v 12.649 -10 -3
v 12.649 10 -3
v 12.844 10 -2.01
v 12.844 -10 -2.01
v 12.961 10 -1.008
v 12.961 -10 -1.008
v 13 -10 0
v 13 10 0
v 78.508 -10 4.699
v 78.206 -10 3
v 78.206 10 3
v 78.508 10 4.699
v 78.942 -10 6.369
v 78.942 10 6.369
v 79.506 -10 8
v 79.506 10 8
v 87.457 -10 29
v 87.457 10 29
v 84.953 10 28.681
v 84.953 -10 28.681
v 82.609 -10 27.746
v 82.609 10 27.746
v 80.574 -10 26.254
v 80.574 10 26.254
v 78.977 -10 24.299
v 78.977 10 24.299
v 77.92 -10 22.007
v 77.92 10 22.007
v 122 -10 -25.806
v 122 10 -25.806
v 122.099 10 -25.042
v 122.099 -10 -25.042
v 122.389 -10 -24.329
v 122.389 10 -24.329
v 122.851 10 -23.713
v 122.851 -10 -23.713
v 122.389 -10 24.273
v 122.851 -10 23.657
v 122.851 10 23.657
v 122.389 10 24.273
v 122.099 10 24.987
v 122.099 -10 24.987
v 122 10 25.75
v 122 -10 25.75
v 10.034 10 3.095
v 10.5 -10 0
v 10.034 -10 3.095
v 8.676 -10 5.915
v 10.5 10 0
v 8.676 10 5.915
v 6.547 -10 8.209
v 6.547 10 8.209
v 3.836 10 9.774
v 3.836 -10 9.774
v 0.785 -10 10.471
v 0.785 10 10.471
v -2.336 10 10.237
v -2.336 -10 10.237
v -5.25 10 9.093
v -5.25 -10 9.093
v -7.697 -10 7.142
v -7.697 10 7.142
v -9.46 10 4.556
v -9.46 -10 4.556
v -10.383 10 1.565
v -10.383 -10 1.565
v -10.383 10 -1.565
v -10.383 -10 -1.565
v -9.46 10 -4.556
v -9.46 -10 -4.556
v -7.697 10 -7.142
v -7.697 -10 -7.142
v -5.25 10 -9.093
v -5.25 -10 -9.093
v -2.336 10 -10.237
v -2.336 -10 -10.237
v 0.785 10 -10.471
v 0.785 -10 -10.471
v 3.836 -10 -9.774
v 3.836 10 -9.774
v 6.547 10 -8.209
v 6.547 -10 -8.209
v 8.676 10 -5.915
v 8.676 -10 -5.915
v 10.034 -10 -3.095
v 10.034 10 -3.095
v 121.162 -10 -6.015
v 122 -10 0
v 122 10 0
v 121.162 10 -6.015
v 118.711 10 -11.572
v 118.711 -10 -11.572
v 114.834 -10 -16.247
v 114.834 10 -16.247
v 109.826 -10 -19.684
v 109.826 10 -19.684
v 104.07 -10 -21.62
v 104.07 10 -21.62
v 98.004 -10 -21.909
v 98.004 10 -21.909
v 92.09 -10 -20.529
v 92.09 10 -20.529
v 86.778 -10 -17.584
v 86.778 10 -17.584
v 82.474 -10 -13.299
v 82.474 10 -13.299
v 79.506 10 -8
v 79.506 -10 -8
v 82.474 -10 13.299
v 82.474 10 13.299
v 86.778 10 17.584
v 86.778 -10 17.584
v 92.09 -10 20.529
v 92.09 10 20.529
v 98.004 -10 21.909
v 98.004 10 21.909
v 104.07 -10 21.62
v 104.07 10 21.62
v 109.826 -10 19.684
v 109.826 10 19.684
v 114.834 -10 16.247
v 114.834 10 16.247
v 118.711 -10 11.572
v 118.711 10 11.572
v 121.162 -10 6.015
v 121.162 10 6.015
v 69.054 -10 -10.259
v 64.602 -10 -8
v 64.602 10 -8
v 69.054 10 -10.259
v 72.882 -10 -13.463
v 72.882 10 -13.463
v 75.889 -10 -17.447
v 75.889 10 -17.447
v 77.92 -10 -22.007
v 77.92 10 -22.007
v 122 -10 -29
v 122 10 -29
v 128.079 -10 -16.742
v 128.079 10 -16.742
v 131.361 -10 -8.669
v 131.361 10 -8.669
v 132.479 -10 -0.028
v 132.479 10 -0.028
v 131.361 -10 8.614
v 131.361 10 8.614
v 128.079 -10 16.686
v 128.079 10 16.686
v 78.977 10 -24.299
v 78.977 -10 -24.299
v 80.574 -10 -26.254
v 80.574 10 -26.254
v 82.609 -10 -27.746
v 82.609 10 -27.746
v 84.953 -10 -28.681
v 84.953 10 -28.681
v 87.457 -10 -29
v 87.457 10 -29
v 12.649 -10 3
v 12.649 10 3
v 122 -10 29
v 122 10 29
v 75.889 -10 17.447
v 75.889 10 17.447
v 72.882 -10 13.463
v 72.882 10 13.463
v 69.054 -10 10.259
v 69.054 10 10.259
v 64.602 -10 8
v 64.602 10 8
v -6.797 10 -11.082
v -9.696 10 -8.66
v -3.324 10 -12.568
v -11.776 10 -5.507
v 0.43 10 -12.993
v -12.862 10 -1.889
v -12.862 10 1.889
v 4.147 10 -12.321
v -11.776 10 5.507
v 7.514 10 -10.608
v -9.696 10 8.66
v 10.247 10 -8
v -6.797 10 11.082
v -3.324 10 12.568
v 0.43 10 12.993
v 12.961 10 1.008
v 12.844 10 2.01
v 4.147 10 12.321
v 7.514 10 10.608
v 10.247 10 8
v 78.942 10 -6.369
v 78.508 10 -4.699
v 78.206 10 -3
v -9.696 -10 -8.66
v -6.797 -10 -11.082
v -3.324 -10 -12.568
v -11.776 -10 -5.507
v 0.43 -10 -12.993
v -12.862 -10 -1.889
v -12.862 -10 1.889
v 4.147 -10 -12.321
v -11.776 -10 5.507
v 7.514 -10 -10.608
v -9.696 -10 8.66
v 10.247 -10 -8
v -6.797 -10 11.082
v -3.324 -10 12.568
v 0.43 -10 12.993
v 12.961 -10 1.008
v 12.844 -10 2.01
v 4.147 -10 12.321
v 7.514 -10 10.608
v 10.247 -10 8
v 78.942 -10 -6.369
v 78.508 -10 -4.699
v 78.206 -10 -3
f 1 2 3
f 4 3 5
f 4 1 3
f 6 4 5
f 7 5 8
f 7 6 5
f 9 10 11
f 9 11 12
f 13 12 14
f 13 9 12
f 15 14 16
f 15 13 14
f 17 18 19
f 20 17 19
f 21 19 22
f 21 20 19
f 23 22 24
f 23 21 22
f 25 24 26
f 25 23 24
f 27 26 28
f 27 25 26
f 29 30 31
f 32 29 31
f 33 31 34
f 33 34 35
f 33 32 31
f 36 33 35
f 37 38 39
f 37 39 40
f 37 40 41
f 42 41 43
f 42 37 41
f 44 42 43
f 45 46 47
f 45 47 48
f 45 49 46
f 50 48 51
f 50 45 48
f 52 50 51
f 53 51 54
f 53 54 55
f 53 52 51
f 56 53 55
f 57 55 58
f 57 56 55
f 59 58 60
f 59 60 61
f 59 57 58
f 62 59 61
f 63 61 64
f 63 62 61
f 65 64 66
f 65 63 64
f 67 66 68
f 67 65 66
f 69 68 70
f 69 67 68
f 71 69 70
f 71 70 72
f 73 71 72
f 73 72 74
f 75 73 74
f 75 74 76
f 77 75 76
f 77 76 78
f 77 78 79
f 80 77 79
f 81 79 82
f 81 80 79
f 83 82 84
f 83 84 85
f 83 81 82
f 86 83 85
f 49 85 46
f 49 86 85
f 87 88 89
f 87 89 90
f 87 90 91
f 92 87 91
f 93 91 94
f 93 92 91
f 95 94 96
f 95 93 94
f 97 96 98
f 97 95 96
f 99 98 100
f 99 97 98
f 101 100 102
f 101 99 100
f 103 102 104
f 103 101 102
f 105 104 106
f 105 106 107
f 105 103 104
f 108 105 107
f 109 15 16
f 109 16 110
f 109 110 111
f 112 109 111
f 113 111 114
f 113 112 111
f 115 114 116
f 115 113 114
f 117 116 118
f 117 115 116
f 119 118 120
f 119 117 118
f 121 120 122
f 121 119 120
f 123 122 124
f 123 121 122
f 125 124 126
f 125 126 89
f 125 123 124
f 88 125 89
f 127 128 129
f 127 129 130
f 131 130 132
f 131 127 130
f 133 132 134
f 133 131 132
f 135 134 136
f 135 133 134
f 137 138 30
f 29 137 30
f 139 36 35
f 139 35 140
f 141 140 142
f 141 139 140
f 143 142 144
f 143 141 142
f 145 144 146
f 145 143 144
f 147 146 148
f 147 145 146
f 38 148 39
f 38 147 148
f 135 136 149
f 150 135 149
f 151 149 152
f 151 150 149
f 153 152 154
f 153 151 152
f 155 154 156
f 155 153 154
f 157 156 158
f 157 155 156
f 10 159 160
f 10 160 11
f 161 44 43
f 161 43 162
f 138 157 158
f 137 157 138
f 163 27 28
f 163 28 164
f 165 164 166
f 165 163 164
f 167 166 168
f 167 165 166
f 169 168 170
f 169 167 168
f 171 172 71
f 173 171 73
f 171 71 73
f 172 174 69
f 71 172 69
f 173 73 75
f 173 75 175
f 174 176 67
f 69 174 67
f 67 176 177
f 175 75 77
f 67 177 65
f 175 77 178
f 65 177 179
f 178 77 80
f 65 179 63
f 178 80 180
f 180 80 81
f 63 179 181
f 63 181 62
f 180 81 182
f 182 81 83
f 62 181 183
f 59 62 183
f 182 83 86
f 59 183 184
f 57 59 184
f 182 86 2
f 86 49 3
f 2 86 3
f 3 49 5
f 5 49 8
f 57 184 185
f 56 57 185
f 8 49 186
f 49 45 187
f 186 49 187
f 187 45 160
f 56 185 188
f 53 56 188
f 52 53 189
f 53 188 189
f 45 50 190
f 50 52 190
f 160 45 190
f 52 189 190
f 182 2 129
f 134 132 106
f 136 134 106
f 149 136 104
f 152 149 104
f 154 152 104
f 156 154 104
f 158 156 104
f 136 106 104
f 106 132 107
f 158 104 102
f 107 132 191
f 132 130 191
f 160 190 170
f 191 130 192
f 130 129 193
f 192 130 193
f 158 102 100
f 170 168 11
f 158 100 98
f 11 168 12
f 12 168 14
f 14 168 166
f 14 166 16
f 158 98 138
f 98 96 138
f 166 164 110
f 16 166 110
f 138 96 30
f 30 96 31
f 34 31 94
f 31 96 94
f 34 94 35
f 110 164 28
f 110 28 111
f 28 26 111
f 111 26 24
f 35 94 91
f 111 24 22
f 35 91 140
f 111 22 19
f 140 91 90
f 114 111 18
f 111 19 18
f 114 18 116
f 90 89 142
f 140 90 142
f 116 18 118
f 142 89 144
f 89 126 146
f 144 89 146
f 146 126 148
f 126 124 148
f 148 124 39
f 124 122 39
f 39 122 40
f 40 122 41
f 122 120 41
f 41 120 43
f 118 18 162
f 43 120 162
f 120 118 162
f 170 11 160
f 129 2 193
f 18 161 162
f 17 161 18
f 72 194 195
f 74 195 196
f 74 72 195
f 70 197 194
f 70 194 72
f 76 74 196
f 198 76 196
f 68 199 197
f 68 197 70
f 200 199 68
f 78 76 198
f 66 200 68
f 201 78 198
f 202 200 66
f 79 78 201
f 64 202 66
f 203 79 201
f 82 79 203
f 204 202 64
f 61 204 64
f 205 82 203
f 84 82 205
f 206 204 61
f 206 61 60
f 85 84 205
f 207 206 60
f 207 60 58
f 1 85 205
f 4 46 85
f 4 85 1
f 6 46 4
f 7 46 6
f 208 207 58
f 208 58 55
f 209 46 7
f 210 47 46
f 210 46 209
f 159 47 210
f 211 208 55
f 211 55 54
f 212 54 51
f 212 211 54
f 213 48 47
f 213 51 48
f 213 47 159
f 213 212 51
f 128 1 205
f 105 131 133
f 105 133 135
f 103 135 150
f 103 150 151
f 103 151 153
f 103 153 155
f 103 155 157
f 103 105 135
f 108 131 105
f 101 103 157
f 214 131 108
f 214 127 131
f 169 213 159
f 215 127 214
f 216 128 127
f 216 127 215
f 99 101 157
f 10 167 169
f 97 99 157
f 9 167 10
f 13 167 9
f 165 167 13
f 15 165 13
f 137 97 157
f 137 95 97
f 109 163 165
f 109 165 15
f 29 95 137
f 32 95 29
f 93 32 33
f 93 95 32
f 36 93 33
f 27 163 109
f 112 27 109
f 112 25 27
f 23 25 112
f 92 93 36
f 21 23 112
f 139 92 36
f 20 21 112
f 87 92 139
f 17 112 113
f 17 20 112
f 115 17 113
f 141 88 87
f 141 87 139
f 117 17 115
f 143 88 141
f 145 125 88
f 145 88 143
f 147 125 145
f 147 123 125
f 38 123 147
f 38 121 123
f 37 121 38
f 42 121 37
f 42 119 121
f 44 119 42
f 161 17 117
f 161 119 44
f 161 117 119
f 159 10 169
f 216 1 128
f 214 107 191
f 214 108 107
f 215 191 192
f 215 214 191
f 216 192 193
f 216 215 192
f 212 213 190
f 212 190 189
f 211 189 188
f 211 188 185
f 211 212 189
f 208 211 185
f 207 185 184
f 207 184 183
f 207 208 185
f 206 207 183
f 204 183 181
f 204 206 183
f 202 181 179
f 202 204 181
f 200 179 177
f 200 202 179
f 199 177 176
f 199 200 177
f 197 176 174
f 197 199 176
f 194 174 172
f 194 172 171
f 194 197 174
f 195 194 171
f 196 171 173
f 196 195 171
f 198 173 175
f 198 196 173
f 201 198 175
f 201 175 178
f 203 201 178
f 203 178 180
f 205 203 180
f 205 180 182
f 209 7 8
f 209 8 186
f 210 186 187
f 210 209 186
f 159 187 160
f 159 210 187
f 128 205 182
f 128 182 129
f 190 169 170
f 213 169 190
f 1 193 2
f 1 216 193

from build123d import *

# Parameters (mm, degrees)
F0_R     = 10.5
F1_DEPTH = 10


with BuildPart() as f1:
    # F0 (on Front) → F1 (new body, symmetric)
    with BuildSketch(Plane.XZ):
        with BuildLine():
            ThreePointArc((12.649111, -3), (12.91198, -1.510225), (13, 0))
            ThreePointArc((13, 0), (12.91198, 1.510225), (12.649111, 3))
            ThreePointArc((12.649111, 3), (11.717824, 5.629617), (10.246951, 8))
            ThreePointArc((10.246951, 8), (-13, 0), (10.246951, -8))
            ThreePointArc((10.246951, -8), (11.717824, -5.629617), (12.649111, -3))
        make_face()
        Circle(F0_R, mode=Mode.SUBTRACT)
        with BuildLine():
            ThreePointArc((10.246951, 8), (11.717824, 5.629617), (12.649111, 3))
            Line((12.649111, 3), (78.205505, 3))
            ThreePointArc((78.205505, 3), (78.70852, 5.538311), (79.506098, 8))
            Line((79.506098, 8), (64.602166, 8))
            Line((64.602166, 8), (10.246951, 8))
        make_face()
        with BuildLine():
            Line((78.205505, -3), (12.649111, -3))
            ThreePointArc((12.649111, -3), (11.717824, -5.629617), (10.246951, -8))
            Line((10.246951, -8), (64.602166, -8))
            Line((64.602166, -8), (79.506098, -8))
            ThreePointArc((79.506098, -8), (78.70852, -5.538311), (78.205505, -3))
        make_face()
        with BuildLine():
            ThreePointArc((77.919916, 22.006825), (72.881564, 13.462612), (64.602166, 8))
            Line((64.602166, 8), (79.506098, 8))
            ThreePointArc((79.506098, 8), (104.070268, 21.620197), (122, 0))
            ThreePointArc((122, 0), (104.070268, -21.620197), (79.506098, -8))
            Line((79.506098, -8), (64.602166, -8))
            ThreePointArc((64.602166, -8), (72.881564, -13.462612), (77.919916, -22.006825))
            ThreePointArc((77.919916, -22.006825), (81.543964, -27.064374), (87.457159, -29))
            Line((87.457159, -29), (122, -29))
            Line((122, -29), (122, -25.805801))
            ThreePointArc((122, -25.805801), (122.220854, -24.676046), (122.850897, -23.712632))
            ThreePointArc((122.850897, -23.712632), (132.479081, -0.027734), (122.850897, 23.657163))
            ThreePointArc((122.850897, 23.657163), (122.220854, 24.620578), (122, 25.750333))
            Line((122, 25.750333), (122, 29))
            Line((122, 29), (87.457159, 29))
            ThreePointArc((87.457159, 29), (81.543964, 27.064374), (77.919916, 22.006825))
        make_face()
    extrude(amount=F1_DEPTH, both=True)


solid = f1.part
